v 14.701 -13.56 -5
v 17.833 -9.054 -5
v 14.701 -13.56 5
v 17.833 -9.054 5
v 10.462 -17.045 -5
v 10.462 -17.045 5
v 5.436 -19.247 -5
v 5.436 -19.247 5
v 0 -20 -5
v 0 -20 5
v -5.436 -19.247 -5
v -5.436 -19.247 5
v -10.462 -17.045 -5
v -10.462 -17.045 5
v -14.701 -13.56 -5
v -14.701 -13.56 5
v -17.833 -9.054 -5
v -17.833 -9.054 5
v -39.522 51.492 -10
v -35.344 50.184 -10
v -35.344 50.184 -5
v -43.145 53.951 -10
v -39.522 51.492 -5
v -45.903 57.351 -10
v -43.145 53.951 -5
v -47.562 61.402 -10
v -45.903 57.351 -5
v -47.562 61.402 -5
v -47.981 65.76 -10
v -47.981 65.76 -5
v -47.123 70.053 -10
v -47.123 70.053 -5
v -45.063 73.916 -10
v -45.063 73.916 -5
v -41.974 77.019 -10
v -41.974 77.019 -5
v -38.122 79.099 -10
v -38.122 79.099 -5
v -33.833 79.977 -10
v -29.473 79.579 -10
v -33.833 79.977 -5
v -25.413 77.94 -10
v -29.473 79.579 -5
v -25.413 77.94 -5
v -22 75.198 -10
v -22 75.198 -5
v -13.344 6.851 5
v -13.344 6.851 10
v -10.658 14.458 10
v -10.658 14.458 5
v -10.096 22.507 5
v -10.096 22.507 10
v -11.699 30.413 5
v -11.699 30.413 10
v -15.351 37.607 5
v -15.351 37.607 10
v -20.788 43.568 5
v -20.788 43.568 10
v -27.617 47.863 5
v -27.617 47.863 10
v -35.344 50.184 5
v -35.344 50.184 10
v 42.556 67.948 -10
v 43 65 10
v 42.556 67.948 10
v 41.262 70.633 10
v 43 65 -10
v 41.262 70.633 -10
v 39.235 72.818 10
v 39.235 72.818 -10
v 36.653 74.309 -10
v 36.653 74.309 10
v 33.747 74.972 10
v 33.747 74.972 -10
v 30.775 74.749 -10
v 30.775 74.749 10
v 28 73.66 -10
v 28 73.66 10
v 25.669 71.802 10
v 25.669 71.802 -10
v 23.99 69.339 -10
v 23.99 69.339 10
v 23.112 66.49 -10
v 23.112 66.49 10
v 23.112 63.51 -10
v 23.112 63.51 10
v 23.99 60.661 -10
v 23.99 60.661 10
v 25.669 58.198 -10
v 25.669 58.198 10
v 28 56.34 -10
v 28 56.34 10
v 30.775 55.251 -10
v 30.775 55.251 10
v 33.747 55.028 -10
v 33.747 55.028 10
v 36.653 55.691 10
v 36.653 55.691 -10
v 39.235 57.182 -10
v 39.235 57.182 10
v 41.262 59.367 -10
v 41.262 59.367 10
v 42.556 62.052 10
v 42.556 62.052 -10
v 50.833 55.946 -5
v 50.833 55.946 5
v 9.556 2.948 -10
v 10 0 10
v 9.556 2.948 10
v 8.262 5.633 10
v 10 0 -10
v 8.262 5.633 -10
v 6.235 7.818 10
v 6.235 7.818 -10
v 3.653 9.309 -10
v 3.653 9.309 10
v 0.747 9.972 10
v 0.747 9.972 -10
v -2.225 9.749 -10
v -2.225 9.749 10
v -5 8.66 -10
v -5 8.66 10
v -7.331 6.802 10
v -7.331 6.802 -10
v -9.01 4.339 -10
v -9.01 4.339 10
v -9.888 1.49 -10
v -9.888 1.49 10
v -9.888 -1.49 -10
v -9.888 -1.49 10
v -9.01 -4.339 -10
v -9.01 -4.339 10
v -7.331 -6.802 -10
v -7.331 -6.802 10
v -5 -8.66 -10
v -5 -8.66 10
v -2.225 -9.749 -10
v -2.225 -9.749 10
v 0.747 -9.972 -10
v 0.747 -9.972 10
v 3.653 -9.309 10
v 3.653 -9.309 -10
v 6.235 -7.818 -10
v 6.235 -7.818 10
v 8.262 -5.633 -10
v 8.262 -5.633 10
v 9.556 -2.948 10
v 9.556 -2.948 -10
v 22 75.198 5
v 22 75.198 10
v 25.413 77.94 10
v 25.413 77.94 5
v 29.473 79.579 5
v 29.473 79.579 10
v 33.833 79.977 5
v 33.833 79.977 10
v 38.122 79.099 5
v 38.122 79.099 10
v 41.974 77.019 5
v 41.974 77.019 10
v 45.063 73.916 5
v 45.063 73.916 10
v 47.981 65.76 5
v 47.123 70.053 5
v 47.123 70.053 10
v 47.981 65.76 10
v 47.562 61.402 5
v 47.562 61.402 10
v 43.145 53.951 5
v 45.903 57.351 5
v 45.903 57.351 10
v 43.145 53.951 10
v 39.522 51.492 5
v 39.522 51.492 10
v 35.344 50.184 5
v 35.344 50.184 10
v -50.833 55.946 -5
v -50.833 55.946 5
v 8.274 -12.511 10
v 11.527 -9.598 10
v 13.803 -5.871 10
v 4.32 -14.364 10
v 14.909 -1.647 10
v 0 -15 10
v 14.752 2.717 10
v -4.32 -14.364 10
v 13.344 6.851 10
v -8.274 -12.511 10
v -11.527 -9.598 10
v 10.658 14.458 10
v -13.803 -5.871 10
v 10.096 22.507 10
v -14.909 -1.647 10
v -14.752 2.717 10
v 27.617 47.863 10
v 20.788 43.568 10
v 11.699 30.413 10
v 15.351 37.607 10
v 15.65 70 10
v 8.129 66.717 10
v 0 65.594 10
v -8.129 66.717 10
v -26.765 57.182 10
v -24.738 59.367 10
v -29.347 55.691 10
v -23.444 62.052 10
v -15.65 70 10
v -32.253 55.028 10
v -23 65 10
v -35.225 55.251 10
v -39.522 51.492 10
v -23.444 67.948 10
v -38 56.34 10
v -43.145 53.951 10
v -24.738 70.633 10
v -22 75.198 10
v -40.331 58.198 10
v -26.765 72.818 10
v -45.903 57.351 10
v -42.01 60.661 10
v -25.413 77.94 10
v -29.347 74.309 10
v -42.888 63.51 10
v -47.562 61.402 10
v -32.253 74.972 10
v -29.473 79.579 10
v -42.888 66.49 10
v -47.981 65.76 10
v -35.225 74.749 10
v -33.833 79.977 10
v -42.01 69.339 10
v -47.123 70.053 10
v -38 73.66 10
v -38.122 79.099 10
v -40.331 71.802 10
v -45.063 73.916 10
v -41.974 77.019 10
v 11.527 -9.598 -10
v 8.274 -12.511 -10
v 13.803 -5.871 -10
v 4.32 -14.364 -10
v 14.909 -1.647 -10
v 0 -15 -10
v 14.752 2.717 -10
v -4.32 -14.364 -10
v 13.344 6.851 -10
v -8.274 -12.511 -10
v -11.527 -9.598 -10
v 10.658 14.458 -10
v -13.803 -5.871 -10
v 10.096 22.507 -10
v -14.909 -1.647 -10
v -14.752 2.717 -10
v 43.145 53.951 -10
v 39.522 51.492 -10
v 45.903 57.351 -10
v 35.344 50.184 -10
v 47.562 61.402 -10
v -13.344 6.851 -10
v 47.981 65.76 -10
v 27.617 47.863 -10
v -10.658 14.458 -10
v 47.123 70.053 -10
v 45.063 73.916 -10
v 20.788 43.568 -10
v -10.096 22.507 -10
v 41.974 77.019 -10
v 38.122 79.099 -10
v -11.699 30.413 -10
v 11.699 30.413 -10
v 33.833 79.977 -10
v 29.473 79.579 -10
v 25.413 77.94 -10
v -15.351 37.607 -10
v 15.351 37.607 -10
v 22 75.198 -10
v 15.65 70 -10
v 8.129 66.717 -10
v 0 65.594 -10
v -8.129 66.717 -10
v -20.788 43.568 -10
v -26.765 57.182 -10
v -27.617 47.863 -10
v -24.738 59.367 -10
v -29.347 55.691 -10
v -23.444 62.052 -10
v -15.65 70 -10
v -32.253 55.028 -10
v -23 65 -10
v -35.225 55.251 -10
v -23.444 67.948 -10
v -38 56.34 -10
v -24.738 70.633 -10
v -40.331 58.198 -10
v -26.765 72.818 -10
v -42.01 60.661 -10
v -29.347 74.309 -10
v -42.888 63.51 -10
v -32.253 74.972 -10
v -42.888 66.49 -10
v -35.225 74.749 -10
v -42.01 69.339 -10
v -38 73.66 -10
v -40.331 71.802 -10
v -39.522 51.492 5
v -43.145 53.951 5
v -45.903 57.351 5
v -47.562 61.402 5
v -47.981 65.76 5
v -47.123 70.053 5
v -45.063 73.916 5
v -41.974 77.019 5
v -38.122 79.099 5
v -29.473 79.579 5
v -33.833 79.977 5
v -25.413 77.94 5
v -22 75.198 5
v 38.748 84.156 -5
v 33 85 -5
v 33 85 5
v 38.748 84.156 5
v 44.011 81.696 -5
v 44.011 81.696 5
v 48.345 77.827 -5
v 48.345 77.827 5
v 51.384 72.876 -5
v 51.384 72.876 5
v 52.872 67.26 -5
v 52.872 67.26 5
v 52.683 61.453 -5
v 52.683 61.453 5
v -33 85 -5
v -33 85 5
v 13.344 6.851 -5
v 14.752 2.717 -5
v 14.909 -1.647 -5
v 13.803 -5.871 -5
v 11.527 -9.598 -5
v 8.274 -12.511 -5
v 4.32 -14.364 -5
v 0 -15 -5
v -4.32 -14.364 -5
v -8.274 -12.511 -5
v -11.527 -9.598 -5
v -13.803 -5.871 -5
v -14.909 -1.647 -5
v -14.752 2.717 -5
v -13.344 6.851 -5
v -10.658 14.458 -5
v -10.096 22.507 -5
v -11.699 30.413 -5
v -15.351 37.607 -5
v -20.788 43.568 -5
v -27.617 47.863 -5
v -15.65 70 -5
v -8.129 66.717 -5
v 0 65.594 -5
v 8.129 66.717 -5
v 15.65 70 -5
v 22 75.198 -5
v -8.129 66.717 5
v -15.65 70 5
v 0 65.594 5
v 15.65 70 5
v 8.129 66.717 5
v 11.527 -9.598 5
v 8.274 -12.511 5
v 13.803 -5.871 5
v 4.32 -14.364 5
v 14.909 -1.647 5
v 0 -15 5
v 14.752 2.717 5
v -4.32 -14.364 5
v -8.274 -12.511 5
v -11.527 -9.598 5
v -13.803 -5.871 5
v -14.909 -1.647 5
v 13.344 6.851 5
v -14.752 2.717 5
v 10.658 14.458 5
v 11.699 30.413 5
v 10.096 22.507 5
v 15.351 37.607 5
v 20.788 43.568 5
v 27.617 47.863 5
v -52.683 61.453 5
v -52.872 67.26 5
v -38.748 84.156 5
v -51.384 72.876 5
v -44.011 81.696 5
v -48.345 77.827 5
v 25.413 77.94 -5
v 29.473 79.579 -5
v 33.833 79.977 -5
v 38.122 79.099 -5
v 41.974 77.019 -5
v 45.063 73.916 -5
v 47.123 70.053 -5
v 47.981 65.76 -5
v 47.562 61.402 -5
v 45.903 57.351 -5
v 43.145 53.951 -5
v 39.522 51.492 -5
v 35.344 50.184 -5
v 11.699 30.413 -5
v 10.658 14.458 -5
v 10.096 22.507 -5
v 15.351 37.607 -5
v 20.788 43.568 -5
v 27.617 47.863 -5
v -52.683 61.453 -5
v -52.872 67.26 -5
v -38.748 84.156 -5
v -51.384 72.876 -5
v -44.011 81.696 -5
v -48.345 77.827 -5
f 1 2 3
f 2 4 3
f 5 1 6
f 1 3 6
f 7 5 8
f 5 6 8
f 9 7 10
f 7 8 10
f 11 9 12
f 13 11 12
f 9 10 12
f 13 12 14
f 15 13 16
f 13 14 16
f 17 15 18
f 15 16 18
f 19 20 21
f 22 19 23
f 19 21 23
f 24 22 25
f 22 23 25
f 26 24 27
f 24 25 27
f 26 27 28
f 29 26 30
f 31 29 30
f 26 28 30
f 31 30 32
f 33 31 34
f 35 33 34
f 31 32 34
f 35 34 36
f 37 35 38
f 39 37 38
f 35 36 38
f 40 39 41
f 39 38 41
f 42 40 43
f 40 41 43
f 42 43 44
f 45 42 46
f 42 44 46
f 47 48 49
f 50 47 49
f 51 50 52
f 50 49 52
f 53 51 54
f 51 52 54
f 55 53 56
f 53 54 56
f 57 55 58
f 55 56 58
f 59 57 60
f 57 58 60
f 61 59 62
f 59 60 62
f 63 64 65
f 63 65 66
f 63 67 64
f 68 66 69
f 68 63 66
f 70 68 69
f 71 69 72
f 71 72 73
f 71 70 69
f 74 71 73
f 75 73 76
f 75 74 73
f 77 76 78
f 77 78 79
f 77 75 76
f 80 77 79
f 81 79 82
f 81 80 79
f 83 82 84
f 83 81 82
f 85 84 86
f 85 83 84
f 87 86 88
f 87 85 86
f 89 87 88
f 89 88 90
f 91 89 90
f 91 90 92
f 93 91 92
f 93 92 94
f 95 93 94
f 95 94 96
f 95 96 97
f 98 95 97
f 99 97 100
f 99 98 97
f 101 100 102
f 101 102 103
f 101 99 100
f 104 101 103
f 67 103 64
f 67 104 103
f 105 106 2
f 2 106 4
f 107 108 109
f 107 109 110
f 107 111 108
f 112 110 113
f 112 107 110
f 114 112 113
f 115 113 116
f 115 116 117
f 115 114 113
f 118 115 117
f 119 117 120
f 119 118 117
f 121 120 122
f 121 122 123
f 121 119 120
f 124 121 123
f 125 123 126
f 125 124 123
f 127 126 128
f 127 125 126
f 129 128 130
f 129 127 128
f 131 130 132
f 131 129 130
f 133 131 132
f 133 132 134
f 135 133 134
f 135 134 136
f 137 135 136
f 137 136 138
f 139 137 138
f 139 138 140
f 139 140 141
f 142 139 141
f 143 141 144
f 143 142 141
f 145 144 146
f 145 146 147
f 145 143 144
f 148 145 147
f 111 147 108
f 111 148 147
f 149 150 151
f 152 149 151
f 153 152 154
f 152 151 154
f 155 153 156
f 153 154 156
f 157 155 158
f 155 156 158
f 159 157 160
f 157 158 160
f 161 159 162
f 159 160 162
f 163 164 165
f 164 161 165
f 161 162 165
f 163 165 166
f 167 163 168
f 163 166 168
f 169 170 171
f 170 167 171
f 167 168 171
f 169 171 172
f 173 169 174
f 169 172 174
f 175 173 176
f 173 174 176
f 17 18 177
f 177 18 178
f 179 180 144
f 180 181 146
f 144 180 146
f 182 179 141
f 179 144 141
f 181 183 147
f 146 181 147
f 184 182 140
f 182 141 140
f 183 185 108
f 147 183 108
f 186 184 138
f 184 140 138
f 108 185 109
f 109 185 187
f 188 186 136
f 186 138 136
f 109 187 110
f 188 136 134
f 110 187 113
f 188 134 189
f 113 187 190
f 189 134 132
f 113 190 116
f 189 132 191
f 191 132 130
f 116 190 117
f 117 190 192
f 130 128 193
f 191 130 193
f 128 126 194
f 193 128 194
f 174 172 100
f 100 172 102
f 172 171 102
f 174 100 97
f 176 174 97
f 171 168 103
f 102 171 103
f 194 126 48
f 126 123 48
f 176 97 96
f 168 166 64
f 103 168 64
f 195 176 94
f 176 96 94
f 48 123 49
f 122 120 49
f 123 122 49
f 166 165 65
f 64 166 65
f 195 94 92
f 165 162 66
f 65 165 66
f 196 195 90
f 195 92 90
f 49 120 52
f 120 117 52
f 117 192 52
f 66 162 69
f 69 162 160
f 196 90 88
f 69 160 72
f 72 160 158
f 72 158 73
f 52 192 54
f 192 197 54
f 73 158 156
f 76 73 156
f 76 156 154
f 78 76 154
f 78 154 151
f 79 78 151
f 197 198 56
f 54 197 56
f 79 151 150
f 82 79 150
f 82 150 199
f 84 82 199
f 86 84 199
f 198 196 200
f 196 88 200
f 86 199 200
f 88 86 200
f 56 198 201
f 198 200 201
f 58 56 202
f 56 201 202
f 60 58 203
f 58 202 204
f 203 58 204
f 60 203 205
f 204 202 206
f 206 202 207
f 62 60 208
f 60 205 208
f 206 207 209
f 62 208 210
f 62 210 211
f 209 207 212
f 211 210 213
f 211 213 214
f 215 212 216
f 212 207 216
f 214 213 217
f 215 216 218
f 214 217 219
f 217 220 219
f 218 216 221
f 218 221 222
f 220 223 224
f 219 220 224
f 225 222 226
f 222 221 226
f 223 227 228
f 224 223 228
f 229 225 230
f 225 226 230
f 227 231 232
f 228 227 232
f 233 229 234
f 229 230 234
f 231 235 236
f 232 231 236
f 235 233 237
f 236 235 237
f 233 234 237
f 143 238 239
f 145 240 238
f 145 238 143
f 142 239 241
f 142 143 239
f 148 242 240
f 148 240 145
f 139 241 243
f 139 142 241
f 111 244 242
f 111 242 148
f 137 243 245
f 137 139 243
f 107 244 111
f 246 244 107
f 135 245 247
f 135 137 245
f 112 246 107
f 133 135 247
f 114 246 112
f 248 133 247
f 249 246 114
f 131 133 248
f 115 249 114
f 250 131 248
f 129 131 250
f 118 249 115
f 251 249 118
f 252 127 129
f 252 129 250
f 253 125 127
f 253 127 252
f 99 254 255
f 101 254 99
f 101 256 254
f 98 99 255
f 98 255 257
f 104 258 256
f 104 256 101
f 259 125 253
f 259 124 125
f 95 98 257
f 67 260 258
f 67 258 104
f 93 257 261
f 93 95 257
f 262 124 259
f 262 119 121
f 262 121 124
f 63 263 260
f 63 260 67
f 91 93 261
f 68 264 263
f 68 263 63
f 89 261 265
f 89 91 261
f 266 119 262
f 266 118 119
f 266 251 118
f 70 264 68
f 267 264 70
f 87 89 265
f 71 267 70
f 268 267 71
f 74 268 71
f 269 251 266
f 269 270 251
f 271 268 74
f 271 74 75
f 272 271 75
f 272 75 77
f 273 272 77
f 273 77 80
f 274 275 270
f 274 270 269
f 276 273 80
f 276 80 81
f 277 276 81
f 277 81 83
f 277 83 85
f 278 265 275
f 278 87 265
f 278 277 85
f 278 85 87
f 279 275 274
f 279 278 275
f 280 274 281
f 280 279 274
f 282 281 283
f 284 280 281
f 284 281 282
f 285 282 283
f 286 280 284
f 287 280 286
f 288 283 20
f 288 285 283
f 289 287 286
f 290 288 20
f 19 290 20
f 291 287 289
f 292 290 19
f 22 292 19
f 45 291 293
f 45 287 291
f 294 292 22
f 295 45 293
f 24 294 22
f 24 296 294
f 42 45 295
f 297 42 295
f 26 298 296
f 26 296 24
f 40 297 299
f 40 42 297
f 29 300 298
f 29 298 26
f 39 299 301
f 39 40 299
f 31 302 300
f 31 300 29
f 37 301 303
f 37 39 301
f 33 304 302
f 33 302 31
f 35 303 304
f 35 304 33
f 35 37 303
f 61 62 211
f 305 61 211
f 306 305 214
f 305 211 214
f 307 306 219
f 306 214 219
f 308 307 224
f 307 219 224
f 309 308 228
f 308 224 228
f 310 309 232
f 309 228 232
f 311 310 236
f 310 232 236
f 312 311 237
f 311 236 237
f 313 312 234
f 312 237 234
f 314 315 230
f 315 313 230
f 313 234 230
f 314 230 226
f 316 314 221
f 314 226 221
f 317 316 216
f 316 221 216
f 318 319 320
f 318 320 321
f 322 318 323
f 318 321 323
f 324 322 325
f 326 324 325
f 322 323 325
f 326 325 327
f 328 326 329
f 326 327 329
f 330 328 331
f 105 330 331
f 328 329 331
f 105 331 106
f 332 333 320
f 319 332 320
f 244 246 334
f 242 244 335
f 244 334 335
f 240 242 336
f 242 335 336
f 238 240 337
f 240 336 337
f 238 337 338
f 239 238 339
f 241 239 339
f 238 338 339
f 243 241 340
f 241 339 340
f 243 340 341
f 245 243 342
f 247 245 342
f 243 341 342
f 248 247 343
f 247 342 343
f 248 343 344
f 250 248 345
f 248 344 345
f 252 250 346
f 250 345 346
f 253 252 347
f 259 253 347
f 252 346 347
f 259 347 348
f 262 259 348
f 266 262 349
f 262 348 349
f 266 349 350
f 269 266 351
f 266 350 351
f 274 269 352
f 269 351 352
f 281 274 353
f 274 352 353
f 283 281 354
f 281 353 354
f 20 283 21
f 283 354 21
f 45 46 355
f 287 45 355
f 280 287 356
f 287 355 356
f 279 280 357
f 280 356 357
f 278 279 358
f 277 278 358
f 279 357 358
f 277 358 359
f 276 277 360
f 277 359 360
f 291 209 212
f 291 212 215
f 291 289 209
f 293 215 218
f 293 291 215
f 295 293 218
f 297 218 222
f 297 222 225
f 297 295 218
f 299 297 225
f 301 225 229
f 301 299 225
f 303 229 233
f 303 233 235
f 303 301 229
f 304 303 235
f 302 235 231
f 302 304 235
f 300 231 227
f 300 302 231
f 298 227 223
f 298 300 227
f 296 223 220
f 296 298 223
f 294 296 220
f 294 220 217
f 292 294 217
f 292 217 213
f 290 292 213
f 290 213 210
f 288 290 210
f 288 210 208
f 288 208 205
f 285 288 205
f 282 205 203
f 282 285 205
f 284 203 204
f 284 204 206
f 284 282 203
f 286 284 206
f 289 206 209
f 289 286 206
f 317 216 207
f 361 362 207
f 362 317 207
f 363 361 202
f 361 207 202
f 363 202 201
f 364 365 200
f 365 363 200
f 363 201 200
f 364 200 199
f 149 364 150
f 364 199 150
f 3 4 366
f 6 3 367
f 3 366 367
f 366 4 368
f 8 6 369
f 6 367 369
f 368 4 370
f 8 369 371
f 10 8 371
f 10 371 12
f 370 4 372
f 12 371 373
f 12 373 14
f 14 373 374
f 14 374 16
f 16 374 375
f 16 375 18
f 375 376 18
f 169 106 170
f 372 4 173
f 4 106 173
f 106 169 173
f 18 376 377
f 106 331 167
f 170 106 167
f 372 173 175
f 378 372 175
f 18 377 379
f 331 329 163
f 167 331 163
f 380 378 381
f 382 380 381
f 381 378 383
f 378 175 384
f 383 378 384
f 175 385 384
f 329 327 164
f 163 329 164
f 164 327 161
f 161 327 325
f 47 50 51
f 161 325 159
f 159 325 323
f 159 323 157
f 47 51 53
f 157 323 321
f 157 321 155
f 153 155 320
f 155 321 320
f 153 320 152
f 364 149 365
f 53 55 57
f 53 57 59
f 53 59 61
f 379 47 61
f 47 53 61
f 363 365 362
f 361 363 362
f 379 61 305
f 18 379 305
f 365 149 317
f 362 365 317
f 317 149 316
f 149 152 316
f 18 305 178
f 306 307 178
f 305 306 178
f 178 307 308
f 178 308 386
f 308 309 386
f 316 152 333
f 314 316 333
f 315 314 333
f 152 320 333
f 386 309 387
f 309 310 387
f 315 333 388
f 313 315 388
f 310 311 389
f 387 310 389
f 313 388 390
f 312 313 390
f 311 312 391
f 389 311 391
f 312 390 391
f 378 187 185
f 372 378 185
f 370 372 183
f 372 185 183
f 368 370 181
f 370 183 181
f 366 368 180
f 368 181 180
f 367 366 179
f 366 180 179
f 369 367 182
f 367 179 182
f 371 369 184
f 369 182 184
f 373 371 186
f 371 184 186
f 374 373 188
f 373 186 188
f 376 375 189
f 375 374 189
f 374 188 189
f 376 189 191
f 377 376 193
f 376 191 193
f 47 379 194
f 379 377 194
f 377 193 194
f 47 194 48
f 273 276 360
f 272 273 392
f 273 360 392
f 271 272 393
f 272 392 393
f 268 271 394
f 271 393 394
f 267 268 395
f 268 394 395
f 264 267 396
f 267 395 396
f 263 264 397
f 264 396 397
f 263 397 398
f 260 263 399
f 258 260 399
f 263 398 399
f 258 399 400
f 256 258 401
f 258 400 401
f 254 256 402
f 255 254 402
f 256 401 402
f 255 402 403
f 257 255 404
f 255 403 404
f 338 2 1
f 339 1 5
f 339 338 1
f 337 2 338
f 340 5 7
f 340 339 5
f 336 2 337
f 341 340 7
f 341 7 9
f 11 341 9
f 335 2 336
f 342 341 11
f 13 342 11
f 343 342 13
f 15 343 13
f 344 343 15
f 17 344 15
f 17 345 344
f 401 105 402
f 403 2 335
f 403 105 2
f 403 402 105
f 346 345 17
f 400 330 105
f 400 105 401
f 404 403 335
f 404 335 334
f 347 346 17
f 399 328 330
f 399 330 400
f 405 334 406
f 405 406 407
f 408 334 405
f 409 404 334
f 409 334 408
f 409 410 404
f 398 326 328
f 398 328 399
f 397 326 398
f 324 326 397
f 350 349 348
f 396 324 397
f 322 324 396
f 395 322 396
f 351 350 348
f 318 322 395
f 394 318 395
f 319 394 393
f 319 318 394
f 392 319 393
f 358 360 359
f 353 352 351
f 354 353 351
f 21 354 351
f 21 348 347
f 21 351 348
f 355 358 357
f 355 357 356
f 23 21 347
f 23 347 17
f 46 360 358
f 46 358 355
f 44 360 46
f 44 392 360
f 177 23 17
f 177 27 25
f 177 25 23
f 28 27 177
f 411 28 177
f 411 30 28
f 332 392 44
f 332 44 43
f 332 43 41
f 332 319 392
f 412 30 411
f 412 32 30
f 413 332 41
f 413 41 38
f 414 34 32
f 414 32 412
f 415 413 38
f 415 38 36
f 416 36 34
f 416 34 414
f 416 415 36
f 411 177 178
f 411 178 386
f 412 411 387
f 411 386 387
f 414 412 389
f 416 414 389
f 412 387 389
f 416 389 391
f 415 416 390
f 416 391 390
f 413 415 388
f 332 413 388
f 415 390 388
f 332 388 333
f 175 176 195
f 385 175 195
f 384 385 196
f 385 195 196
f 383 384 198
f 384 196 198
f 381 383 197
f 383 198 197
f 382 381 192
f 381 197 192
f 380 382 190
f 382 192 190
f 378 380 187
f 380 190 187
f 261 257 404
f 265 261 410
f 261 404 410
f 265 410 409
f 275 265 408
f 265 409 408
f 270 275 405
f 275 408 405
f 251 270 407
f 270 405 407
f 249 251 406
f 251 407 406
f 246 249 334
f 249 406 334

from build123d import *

# Parameters (mm, degrees)
SKETCH1_R           = 10
BOSS_EXTRUDE1_DEPTH = 10
BOSS_EXTRUDE2_DEPTH = 5


with BuildPart() as part:
    # Sketch1 → Boss-Extrude1 (new, symmetric)
    with BuildSketch(Plane.XY):
        with BuildLine():
            ThreePointArc((-35.344077706, 50.184288755), (-13.282230039, 34.133637057), (-13.344077706, 6.850955421))
            ThreePointArc((-13.344077706, 6.850955421), (0, -15), (13.344077706, 6.850955421))
            ThreePointArc((13.344077706, 6.850955421), (13.282230039, 34.133637057), (35.344077706, 50.184288755))
            ThreePointArc((35.344077706, 50.184288755), (46.234544698, 72.060228511), (22, 75.198039027))
            ThreePointArc((22, 75.198039027), (0, 65.594117082), (-22, 75.198039027))
            ThreePointArc((-22, 75.198039027), (-46.234544698, 72.060228511), (-35.344077706, 50.184288755))
        make_face()
        Circle(SKETCH1_R, mode=Mode.SUBTRACT)
        with Locations((-33, 65)):
            Circle(SKETCH1_R, mode=Mode.SUBTRACT)
        with Locations((33, 65)):
            Circle(SKETCH1_R, mode=Mode.SUBTRACT)
    extrude(amount=BOSS_EXTRUDE1_DEPTH, both=True)

    # Sketch1<3> → Boss-Extrude2 (add, symmetric)
    with BuildSketch(Plane.XY):
        with BuildLine():
            ThreePointArc((-33, 85), (-50.045189115, 75.462386346), (-50.833335385, 55.946152804))
            Line((-50.833335385, 55.946152804), (-17.833335385, -9.053847196))
            ThreePointArc((-17.833335385, -9.053847196), (0, -20), (17.833335385, -9.053847196))
            Line((17.833335385, -9.053847196), (50.833335385, 55.946152804))
            ThreePointArc((50.833335385, 55.946152804), (50.045189115, 75.462386346), (33, 85))
            Line((33, 85), (-33, 85))
        make_face()
        with BuildLine():
            ThreePointArc((13.344077706, 6.850955421), (0, -15), (-13.344077706, 6.850955421))
            ThreePointArc((-13.344077706, 6.850955421), (-13.282230039, 34.133637057), (-35.344077706, 50.184288755))
            ThreePointArc((-35.344077706, 50.184288755), (-46.234544698, 72.060228511), (-22, 75.198039027))
            ThreePointArc((-22, 75.198039027), (0, 65.594117082), (22, 75.198039027))
            ThreePointArc((22, 75.198039027), (46.234544698, 72.060228511), (35.344077706, 50.184288755))
            ThreePointArc((35.344077706, 50.184288755), (13.282230039, 34.133637057), (13.344077706, 6.850955421))
        make_face(mode=Mode.SUBTRACT)
    extrude(amount=BOSS_EXTRUDE2_DEPTH, both=True)


solid = part.part
